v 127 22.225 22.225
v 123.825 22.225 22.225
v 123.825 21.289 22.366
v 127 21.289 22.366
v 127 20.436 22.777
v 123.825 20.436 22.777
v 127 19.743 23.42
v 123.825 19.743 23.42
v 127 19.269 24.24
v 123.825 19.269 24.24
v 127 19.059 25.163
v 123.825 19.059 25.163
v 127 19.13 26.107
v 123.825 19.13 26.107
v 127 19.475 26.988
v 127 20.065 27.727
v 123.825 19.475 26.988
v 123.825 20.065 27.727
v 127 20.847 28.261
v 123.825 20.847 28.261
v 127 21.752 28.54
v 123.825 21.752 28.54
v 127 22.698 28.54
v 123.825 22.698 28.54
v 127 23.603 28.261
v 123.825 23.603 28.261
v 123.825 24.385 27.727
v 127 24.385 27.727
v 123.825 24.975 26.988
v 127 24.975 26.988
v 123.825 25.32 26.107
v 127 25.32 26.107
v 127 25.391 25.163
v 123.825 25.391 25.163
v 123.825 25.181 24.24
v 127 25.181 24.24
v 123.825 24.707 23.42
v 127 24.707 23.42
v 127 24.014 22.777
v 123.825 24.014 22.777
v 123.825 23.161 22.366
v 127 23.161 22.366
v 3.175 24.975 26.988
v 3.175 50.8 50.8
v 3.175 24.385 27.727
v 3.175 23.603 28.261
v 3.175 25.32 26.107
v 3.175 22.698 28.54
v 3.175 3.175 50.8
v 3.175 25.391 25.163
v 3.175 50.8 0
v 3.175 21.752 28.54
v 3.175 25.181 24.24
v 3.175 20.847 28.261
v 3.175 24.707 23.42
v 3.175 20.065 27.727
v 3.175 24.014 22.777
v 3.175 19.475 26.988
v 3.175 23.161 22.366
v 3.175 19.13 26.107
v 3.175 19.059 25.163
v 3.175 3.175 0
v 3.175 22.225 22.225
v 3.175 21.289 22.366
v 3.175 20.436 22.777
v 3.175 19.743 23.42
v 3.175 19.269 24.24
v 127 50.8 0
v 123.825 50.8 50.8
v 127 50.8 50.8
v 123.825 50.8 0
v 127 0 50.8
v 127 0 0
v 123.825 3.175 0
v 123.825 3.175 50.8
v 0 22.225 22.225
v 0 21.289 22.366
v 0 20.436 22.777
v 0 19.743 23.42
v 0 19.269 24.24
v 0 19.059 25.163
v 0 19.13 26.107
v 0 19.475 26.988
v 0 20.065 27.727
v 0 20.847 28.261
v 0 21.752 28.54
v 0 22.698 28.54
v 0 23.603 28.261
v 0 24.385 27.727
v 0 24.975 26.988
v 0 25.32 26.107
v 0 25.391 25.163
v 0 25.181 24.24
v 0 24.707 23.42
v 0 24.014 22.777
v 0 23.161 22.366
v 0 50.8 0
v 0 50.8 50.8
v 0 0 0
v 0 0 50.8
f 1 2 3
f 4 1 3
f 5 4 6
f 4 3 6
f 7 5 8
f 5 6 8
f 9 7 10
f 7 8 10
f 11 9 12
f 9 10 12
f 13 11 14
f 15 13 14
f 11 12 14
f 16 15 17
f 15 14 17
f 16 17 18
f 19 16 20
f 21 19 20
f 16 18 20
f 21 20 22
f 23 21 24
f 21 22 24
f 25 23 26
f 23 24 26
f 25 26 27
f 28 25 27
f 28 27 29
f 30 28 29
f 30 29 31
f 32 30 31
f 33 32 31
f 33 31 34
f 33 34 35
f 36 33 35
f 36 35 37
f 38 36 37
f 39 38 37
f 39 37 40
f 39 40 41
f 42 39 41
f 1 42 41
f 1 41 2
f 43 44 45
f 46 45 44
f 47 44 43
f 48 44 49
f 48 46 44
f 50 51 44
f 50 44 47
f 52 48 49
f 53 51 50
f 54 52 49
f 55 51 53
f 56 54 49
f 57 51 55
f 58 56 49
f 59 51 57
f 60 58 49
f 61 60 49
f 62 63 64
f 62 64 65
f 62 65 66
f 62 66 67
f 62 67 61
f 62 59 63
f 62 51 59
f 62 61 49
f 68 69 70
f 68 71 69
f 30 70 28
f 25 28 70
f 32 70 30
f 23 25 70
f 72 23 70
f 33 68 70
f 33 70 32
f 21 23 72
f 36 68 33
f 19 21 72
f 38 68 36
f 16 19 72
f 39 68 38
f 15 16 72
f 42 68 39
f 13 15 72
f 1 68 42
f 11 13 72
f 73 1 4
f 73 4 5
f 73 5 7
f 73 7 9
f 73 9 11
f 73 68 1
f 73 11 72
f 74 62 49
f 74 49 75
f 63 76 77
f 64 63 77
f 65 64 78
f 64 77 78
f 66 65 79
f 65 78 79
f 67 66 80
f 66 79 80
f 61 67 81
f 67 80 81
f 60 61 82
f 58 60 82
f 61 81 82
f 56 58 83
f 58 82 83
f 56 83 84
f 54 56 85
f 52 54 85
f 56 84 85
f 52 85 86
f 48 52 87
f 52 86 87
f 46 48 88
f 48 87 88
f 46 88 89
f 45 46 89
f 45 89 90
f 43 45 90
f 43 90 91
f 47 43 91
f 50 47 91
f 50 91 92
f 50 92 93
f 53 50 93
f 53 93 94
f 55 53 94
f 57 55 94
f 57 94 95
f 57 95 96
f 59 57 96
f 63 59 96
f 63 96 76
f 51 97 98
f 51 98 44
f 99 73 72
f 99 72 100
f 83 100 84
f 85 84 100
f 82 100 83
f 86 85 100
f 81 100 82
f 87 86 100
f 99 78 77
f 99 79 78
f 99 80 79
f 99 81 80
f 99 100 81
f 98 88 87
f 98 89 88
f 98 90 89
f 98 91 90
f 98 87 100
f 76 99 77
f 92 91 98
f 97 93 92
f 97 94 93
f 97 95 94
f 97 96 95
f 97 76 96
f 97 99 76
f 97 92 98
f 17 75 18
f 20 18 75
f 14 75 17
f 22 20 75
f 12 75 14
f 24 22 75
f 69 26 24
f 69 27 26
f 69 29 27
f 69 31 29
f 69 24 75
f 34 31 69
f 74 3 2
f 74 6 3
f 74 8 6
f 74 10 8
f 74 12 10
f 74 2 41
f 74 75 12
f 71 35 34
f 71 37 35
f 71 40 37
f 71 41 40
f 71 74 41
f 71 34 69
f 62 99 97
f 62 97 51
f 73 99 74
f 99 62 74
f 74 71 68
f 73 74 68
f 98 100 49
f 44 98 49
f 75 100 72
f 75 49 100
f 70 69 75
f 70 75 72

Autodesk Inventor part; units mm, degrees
ref_plane "YZ Plane" through (0, 0, 0) normal (1, 0, 0) x (0, 1, 0)
ref_plane "XZ Plane" through (0, 0, 0) normal (0, 1, 0) x (-1, 0, 0)
ref_plane "XY Plane" through (0, 0, 0) normal (0, 0, 1) x (1, 0, 0)
sketch "Sketch1" plane through (0, 0, 0) normal (0, 0, 1) x (1, 0, 0)
  line L0 (0, 0) -> (0, 50.8)
  line L1 (0, 50.8) -> (3.175, 50.8)
  line L2 (3.175, 50.8) -> (3.175, 3.175)
  line L3 (3.175, 3.175) -> (123.825, 3.175)
  line L4 (123.825, 3.175) -> (123.825, 50.8)
  line L5 (123.825, 50.8) -> (127, 50.8)
  line L6 (127, 50.8) -> (127, 0)
  line L7 (127, 0) -> (0, 0)
  dimension "d0" = 3.175
  dimension "d2" = 3.175
  dimension "d3" = 3.175
  dimension "d4" = 127
  dimension "d5" = 50.8
extrude "Extrusion1" add sketch "Sketch1" along normal blind 50.8
sketch "Sketch2" plane through (127, 0, 0) normal (1, 0, 0) x (0, 0, -1)
  line L0 (0, 50.8) -> (0, 0) projected
  line L1 (0, 50.8) -> (-50.8, 50.8) projected
  line L2 (-50.8, 0) -> (-50.8, 50.8) projected
  line L3 (0, 0) -> (-50.8, 0) projected
  point P0 (0, 0)
  point P1 (-25.4, 22.225)
  dimension "d8" = 25.4
  dimension "d9" = 25.4
  dimension "d10" = 22.225
hole "Hole1" at (127, 22.225, 25.4) direction (-1, 0, 0) diameter 6.35 end through all
equation "\"d2\" = d0"
equation "\"d3\" = d0"
equation "\"d8\" = d9"
properties part number "ScissorLIftBracketOutside"
